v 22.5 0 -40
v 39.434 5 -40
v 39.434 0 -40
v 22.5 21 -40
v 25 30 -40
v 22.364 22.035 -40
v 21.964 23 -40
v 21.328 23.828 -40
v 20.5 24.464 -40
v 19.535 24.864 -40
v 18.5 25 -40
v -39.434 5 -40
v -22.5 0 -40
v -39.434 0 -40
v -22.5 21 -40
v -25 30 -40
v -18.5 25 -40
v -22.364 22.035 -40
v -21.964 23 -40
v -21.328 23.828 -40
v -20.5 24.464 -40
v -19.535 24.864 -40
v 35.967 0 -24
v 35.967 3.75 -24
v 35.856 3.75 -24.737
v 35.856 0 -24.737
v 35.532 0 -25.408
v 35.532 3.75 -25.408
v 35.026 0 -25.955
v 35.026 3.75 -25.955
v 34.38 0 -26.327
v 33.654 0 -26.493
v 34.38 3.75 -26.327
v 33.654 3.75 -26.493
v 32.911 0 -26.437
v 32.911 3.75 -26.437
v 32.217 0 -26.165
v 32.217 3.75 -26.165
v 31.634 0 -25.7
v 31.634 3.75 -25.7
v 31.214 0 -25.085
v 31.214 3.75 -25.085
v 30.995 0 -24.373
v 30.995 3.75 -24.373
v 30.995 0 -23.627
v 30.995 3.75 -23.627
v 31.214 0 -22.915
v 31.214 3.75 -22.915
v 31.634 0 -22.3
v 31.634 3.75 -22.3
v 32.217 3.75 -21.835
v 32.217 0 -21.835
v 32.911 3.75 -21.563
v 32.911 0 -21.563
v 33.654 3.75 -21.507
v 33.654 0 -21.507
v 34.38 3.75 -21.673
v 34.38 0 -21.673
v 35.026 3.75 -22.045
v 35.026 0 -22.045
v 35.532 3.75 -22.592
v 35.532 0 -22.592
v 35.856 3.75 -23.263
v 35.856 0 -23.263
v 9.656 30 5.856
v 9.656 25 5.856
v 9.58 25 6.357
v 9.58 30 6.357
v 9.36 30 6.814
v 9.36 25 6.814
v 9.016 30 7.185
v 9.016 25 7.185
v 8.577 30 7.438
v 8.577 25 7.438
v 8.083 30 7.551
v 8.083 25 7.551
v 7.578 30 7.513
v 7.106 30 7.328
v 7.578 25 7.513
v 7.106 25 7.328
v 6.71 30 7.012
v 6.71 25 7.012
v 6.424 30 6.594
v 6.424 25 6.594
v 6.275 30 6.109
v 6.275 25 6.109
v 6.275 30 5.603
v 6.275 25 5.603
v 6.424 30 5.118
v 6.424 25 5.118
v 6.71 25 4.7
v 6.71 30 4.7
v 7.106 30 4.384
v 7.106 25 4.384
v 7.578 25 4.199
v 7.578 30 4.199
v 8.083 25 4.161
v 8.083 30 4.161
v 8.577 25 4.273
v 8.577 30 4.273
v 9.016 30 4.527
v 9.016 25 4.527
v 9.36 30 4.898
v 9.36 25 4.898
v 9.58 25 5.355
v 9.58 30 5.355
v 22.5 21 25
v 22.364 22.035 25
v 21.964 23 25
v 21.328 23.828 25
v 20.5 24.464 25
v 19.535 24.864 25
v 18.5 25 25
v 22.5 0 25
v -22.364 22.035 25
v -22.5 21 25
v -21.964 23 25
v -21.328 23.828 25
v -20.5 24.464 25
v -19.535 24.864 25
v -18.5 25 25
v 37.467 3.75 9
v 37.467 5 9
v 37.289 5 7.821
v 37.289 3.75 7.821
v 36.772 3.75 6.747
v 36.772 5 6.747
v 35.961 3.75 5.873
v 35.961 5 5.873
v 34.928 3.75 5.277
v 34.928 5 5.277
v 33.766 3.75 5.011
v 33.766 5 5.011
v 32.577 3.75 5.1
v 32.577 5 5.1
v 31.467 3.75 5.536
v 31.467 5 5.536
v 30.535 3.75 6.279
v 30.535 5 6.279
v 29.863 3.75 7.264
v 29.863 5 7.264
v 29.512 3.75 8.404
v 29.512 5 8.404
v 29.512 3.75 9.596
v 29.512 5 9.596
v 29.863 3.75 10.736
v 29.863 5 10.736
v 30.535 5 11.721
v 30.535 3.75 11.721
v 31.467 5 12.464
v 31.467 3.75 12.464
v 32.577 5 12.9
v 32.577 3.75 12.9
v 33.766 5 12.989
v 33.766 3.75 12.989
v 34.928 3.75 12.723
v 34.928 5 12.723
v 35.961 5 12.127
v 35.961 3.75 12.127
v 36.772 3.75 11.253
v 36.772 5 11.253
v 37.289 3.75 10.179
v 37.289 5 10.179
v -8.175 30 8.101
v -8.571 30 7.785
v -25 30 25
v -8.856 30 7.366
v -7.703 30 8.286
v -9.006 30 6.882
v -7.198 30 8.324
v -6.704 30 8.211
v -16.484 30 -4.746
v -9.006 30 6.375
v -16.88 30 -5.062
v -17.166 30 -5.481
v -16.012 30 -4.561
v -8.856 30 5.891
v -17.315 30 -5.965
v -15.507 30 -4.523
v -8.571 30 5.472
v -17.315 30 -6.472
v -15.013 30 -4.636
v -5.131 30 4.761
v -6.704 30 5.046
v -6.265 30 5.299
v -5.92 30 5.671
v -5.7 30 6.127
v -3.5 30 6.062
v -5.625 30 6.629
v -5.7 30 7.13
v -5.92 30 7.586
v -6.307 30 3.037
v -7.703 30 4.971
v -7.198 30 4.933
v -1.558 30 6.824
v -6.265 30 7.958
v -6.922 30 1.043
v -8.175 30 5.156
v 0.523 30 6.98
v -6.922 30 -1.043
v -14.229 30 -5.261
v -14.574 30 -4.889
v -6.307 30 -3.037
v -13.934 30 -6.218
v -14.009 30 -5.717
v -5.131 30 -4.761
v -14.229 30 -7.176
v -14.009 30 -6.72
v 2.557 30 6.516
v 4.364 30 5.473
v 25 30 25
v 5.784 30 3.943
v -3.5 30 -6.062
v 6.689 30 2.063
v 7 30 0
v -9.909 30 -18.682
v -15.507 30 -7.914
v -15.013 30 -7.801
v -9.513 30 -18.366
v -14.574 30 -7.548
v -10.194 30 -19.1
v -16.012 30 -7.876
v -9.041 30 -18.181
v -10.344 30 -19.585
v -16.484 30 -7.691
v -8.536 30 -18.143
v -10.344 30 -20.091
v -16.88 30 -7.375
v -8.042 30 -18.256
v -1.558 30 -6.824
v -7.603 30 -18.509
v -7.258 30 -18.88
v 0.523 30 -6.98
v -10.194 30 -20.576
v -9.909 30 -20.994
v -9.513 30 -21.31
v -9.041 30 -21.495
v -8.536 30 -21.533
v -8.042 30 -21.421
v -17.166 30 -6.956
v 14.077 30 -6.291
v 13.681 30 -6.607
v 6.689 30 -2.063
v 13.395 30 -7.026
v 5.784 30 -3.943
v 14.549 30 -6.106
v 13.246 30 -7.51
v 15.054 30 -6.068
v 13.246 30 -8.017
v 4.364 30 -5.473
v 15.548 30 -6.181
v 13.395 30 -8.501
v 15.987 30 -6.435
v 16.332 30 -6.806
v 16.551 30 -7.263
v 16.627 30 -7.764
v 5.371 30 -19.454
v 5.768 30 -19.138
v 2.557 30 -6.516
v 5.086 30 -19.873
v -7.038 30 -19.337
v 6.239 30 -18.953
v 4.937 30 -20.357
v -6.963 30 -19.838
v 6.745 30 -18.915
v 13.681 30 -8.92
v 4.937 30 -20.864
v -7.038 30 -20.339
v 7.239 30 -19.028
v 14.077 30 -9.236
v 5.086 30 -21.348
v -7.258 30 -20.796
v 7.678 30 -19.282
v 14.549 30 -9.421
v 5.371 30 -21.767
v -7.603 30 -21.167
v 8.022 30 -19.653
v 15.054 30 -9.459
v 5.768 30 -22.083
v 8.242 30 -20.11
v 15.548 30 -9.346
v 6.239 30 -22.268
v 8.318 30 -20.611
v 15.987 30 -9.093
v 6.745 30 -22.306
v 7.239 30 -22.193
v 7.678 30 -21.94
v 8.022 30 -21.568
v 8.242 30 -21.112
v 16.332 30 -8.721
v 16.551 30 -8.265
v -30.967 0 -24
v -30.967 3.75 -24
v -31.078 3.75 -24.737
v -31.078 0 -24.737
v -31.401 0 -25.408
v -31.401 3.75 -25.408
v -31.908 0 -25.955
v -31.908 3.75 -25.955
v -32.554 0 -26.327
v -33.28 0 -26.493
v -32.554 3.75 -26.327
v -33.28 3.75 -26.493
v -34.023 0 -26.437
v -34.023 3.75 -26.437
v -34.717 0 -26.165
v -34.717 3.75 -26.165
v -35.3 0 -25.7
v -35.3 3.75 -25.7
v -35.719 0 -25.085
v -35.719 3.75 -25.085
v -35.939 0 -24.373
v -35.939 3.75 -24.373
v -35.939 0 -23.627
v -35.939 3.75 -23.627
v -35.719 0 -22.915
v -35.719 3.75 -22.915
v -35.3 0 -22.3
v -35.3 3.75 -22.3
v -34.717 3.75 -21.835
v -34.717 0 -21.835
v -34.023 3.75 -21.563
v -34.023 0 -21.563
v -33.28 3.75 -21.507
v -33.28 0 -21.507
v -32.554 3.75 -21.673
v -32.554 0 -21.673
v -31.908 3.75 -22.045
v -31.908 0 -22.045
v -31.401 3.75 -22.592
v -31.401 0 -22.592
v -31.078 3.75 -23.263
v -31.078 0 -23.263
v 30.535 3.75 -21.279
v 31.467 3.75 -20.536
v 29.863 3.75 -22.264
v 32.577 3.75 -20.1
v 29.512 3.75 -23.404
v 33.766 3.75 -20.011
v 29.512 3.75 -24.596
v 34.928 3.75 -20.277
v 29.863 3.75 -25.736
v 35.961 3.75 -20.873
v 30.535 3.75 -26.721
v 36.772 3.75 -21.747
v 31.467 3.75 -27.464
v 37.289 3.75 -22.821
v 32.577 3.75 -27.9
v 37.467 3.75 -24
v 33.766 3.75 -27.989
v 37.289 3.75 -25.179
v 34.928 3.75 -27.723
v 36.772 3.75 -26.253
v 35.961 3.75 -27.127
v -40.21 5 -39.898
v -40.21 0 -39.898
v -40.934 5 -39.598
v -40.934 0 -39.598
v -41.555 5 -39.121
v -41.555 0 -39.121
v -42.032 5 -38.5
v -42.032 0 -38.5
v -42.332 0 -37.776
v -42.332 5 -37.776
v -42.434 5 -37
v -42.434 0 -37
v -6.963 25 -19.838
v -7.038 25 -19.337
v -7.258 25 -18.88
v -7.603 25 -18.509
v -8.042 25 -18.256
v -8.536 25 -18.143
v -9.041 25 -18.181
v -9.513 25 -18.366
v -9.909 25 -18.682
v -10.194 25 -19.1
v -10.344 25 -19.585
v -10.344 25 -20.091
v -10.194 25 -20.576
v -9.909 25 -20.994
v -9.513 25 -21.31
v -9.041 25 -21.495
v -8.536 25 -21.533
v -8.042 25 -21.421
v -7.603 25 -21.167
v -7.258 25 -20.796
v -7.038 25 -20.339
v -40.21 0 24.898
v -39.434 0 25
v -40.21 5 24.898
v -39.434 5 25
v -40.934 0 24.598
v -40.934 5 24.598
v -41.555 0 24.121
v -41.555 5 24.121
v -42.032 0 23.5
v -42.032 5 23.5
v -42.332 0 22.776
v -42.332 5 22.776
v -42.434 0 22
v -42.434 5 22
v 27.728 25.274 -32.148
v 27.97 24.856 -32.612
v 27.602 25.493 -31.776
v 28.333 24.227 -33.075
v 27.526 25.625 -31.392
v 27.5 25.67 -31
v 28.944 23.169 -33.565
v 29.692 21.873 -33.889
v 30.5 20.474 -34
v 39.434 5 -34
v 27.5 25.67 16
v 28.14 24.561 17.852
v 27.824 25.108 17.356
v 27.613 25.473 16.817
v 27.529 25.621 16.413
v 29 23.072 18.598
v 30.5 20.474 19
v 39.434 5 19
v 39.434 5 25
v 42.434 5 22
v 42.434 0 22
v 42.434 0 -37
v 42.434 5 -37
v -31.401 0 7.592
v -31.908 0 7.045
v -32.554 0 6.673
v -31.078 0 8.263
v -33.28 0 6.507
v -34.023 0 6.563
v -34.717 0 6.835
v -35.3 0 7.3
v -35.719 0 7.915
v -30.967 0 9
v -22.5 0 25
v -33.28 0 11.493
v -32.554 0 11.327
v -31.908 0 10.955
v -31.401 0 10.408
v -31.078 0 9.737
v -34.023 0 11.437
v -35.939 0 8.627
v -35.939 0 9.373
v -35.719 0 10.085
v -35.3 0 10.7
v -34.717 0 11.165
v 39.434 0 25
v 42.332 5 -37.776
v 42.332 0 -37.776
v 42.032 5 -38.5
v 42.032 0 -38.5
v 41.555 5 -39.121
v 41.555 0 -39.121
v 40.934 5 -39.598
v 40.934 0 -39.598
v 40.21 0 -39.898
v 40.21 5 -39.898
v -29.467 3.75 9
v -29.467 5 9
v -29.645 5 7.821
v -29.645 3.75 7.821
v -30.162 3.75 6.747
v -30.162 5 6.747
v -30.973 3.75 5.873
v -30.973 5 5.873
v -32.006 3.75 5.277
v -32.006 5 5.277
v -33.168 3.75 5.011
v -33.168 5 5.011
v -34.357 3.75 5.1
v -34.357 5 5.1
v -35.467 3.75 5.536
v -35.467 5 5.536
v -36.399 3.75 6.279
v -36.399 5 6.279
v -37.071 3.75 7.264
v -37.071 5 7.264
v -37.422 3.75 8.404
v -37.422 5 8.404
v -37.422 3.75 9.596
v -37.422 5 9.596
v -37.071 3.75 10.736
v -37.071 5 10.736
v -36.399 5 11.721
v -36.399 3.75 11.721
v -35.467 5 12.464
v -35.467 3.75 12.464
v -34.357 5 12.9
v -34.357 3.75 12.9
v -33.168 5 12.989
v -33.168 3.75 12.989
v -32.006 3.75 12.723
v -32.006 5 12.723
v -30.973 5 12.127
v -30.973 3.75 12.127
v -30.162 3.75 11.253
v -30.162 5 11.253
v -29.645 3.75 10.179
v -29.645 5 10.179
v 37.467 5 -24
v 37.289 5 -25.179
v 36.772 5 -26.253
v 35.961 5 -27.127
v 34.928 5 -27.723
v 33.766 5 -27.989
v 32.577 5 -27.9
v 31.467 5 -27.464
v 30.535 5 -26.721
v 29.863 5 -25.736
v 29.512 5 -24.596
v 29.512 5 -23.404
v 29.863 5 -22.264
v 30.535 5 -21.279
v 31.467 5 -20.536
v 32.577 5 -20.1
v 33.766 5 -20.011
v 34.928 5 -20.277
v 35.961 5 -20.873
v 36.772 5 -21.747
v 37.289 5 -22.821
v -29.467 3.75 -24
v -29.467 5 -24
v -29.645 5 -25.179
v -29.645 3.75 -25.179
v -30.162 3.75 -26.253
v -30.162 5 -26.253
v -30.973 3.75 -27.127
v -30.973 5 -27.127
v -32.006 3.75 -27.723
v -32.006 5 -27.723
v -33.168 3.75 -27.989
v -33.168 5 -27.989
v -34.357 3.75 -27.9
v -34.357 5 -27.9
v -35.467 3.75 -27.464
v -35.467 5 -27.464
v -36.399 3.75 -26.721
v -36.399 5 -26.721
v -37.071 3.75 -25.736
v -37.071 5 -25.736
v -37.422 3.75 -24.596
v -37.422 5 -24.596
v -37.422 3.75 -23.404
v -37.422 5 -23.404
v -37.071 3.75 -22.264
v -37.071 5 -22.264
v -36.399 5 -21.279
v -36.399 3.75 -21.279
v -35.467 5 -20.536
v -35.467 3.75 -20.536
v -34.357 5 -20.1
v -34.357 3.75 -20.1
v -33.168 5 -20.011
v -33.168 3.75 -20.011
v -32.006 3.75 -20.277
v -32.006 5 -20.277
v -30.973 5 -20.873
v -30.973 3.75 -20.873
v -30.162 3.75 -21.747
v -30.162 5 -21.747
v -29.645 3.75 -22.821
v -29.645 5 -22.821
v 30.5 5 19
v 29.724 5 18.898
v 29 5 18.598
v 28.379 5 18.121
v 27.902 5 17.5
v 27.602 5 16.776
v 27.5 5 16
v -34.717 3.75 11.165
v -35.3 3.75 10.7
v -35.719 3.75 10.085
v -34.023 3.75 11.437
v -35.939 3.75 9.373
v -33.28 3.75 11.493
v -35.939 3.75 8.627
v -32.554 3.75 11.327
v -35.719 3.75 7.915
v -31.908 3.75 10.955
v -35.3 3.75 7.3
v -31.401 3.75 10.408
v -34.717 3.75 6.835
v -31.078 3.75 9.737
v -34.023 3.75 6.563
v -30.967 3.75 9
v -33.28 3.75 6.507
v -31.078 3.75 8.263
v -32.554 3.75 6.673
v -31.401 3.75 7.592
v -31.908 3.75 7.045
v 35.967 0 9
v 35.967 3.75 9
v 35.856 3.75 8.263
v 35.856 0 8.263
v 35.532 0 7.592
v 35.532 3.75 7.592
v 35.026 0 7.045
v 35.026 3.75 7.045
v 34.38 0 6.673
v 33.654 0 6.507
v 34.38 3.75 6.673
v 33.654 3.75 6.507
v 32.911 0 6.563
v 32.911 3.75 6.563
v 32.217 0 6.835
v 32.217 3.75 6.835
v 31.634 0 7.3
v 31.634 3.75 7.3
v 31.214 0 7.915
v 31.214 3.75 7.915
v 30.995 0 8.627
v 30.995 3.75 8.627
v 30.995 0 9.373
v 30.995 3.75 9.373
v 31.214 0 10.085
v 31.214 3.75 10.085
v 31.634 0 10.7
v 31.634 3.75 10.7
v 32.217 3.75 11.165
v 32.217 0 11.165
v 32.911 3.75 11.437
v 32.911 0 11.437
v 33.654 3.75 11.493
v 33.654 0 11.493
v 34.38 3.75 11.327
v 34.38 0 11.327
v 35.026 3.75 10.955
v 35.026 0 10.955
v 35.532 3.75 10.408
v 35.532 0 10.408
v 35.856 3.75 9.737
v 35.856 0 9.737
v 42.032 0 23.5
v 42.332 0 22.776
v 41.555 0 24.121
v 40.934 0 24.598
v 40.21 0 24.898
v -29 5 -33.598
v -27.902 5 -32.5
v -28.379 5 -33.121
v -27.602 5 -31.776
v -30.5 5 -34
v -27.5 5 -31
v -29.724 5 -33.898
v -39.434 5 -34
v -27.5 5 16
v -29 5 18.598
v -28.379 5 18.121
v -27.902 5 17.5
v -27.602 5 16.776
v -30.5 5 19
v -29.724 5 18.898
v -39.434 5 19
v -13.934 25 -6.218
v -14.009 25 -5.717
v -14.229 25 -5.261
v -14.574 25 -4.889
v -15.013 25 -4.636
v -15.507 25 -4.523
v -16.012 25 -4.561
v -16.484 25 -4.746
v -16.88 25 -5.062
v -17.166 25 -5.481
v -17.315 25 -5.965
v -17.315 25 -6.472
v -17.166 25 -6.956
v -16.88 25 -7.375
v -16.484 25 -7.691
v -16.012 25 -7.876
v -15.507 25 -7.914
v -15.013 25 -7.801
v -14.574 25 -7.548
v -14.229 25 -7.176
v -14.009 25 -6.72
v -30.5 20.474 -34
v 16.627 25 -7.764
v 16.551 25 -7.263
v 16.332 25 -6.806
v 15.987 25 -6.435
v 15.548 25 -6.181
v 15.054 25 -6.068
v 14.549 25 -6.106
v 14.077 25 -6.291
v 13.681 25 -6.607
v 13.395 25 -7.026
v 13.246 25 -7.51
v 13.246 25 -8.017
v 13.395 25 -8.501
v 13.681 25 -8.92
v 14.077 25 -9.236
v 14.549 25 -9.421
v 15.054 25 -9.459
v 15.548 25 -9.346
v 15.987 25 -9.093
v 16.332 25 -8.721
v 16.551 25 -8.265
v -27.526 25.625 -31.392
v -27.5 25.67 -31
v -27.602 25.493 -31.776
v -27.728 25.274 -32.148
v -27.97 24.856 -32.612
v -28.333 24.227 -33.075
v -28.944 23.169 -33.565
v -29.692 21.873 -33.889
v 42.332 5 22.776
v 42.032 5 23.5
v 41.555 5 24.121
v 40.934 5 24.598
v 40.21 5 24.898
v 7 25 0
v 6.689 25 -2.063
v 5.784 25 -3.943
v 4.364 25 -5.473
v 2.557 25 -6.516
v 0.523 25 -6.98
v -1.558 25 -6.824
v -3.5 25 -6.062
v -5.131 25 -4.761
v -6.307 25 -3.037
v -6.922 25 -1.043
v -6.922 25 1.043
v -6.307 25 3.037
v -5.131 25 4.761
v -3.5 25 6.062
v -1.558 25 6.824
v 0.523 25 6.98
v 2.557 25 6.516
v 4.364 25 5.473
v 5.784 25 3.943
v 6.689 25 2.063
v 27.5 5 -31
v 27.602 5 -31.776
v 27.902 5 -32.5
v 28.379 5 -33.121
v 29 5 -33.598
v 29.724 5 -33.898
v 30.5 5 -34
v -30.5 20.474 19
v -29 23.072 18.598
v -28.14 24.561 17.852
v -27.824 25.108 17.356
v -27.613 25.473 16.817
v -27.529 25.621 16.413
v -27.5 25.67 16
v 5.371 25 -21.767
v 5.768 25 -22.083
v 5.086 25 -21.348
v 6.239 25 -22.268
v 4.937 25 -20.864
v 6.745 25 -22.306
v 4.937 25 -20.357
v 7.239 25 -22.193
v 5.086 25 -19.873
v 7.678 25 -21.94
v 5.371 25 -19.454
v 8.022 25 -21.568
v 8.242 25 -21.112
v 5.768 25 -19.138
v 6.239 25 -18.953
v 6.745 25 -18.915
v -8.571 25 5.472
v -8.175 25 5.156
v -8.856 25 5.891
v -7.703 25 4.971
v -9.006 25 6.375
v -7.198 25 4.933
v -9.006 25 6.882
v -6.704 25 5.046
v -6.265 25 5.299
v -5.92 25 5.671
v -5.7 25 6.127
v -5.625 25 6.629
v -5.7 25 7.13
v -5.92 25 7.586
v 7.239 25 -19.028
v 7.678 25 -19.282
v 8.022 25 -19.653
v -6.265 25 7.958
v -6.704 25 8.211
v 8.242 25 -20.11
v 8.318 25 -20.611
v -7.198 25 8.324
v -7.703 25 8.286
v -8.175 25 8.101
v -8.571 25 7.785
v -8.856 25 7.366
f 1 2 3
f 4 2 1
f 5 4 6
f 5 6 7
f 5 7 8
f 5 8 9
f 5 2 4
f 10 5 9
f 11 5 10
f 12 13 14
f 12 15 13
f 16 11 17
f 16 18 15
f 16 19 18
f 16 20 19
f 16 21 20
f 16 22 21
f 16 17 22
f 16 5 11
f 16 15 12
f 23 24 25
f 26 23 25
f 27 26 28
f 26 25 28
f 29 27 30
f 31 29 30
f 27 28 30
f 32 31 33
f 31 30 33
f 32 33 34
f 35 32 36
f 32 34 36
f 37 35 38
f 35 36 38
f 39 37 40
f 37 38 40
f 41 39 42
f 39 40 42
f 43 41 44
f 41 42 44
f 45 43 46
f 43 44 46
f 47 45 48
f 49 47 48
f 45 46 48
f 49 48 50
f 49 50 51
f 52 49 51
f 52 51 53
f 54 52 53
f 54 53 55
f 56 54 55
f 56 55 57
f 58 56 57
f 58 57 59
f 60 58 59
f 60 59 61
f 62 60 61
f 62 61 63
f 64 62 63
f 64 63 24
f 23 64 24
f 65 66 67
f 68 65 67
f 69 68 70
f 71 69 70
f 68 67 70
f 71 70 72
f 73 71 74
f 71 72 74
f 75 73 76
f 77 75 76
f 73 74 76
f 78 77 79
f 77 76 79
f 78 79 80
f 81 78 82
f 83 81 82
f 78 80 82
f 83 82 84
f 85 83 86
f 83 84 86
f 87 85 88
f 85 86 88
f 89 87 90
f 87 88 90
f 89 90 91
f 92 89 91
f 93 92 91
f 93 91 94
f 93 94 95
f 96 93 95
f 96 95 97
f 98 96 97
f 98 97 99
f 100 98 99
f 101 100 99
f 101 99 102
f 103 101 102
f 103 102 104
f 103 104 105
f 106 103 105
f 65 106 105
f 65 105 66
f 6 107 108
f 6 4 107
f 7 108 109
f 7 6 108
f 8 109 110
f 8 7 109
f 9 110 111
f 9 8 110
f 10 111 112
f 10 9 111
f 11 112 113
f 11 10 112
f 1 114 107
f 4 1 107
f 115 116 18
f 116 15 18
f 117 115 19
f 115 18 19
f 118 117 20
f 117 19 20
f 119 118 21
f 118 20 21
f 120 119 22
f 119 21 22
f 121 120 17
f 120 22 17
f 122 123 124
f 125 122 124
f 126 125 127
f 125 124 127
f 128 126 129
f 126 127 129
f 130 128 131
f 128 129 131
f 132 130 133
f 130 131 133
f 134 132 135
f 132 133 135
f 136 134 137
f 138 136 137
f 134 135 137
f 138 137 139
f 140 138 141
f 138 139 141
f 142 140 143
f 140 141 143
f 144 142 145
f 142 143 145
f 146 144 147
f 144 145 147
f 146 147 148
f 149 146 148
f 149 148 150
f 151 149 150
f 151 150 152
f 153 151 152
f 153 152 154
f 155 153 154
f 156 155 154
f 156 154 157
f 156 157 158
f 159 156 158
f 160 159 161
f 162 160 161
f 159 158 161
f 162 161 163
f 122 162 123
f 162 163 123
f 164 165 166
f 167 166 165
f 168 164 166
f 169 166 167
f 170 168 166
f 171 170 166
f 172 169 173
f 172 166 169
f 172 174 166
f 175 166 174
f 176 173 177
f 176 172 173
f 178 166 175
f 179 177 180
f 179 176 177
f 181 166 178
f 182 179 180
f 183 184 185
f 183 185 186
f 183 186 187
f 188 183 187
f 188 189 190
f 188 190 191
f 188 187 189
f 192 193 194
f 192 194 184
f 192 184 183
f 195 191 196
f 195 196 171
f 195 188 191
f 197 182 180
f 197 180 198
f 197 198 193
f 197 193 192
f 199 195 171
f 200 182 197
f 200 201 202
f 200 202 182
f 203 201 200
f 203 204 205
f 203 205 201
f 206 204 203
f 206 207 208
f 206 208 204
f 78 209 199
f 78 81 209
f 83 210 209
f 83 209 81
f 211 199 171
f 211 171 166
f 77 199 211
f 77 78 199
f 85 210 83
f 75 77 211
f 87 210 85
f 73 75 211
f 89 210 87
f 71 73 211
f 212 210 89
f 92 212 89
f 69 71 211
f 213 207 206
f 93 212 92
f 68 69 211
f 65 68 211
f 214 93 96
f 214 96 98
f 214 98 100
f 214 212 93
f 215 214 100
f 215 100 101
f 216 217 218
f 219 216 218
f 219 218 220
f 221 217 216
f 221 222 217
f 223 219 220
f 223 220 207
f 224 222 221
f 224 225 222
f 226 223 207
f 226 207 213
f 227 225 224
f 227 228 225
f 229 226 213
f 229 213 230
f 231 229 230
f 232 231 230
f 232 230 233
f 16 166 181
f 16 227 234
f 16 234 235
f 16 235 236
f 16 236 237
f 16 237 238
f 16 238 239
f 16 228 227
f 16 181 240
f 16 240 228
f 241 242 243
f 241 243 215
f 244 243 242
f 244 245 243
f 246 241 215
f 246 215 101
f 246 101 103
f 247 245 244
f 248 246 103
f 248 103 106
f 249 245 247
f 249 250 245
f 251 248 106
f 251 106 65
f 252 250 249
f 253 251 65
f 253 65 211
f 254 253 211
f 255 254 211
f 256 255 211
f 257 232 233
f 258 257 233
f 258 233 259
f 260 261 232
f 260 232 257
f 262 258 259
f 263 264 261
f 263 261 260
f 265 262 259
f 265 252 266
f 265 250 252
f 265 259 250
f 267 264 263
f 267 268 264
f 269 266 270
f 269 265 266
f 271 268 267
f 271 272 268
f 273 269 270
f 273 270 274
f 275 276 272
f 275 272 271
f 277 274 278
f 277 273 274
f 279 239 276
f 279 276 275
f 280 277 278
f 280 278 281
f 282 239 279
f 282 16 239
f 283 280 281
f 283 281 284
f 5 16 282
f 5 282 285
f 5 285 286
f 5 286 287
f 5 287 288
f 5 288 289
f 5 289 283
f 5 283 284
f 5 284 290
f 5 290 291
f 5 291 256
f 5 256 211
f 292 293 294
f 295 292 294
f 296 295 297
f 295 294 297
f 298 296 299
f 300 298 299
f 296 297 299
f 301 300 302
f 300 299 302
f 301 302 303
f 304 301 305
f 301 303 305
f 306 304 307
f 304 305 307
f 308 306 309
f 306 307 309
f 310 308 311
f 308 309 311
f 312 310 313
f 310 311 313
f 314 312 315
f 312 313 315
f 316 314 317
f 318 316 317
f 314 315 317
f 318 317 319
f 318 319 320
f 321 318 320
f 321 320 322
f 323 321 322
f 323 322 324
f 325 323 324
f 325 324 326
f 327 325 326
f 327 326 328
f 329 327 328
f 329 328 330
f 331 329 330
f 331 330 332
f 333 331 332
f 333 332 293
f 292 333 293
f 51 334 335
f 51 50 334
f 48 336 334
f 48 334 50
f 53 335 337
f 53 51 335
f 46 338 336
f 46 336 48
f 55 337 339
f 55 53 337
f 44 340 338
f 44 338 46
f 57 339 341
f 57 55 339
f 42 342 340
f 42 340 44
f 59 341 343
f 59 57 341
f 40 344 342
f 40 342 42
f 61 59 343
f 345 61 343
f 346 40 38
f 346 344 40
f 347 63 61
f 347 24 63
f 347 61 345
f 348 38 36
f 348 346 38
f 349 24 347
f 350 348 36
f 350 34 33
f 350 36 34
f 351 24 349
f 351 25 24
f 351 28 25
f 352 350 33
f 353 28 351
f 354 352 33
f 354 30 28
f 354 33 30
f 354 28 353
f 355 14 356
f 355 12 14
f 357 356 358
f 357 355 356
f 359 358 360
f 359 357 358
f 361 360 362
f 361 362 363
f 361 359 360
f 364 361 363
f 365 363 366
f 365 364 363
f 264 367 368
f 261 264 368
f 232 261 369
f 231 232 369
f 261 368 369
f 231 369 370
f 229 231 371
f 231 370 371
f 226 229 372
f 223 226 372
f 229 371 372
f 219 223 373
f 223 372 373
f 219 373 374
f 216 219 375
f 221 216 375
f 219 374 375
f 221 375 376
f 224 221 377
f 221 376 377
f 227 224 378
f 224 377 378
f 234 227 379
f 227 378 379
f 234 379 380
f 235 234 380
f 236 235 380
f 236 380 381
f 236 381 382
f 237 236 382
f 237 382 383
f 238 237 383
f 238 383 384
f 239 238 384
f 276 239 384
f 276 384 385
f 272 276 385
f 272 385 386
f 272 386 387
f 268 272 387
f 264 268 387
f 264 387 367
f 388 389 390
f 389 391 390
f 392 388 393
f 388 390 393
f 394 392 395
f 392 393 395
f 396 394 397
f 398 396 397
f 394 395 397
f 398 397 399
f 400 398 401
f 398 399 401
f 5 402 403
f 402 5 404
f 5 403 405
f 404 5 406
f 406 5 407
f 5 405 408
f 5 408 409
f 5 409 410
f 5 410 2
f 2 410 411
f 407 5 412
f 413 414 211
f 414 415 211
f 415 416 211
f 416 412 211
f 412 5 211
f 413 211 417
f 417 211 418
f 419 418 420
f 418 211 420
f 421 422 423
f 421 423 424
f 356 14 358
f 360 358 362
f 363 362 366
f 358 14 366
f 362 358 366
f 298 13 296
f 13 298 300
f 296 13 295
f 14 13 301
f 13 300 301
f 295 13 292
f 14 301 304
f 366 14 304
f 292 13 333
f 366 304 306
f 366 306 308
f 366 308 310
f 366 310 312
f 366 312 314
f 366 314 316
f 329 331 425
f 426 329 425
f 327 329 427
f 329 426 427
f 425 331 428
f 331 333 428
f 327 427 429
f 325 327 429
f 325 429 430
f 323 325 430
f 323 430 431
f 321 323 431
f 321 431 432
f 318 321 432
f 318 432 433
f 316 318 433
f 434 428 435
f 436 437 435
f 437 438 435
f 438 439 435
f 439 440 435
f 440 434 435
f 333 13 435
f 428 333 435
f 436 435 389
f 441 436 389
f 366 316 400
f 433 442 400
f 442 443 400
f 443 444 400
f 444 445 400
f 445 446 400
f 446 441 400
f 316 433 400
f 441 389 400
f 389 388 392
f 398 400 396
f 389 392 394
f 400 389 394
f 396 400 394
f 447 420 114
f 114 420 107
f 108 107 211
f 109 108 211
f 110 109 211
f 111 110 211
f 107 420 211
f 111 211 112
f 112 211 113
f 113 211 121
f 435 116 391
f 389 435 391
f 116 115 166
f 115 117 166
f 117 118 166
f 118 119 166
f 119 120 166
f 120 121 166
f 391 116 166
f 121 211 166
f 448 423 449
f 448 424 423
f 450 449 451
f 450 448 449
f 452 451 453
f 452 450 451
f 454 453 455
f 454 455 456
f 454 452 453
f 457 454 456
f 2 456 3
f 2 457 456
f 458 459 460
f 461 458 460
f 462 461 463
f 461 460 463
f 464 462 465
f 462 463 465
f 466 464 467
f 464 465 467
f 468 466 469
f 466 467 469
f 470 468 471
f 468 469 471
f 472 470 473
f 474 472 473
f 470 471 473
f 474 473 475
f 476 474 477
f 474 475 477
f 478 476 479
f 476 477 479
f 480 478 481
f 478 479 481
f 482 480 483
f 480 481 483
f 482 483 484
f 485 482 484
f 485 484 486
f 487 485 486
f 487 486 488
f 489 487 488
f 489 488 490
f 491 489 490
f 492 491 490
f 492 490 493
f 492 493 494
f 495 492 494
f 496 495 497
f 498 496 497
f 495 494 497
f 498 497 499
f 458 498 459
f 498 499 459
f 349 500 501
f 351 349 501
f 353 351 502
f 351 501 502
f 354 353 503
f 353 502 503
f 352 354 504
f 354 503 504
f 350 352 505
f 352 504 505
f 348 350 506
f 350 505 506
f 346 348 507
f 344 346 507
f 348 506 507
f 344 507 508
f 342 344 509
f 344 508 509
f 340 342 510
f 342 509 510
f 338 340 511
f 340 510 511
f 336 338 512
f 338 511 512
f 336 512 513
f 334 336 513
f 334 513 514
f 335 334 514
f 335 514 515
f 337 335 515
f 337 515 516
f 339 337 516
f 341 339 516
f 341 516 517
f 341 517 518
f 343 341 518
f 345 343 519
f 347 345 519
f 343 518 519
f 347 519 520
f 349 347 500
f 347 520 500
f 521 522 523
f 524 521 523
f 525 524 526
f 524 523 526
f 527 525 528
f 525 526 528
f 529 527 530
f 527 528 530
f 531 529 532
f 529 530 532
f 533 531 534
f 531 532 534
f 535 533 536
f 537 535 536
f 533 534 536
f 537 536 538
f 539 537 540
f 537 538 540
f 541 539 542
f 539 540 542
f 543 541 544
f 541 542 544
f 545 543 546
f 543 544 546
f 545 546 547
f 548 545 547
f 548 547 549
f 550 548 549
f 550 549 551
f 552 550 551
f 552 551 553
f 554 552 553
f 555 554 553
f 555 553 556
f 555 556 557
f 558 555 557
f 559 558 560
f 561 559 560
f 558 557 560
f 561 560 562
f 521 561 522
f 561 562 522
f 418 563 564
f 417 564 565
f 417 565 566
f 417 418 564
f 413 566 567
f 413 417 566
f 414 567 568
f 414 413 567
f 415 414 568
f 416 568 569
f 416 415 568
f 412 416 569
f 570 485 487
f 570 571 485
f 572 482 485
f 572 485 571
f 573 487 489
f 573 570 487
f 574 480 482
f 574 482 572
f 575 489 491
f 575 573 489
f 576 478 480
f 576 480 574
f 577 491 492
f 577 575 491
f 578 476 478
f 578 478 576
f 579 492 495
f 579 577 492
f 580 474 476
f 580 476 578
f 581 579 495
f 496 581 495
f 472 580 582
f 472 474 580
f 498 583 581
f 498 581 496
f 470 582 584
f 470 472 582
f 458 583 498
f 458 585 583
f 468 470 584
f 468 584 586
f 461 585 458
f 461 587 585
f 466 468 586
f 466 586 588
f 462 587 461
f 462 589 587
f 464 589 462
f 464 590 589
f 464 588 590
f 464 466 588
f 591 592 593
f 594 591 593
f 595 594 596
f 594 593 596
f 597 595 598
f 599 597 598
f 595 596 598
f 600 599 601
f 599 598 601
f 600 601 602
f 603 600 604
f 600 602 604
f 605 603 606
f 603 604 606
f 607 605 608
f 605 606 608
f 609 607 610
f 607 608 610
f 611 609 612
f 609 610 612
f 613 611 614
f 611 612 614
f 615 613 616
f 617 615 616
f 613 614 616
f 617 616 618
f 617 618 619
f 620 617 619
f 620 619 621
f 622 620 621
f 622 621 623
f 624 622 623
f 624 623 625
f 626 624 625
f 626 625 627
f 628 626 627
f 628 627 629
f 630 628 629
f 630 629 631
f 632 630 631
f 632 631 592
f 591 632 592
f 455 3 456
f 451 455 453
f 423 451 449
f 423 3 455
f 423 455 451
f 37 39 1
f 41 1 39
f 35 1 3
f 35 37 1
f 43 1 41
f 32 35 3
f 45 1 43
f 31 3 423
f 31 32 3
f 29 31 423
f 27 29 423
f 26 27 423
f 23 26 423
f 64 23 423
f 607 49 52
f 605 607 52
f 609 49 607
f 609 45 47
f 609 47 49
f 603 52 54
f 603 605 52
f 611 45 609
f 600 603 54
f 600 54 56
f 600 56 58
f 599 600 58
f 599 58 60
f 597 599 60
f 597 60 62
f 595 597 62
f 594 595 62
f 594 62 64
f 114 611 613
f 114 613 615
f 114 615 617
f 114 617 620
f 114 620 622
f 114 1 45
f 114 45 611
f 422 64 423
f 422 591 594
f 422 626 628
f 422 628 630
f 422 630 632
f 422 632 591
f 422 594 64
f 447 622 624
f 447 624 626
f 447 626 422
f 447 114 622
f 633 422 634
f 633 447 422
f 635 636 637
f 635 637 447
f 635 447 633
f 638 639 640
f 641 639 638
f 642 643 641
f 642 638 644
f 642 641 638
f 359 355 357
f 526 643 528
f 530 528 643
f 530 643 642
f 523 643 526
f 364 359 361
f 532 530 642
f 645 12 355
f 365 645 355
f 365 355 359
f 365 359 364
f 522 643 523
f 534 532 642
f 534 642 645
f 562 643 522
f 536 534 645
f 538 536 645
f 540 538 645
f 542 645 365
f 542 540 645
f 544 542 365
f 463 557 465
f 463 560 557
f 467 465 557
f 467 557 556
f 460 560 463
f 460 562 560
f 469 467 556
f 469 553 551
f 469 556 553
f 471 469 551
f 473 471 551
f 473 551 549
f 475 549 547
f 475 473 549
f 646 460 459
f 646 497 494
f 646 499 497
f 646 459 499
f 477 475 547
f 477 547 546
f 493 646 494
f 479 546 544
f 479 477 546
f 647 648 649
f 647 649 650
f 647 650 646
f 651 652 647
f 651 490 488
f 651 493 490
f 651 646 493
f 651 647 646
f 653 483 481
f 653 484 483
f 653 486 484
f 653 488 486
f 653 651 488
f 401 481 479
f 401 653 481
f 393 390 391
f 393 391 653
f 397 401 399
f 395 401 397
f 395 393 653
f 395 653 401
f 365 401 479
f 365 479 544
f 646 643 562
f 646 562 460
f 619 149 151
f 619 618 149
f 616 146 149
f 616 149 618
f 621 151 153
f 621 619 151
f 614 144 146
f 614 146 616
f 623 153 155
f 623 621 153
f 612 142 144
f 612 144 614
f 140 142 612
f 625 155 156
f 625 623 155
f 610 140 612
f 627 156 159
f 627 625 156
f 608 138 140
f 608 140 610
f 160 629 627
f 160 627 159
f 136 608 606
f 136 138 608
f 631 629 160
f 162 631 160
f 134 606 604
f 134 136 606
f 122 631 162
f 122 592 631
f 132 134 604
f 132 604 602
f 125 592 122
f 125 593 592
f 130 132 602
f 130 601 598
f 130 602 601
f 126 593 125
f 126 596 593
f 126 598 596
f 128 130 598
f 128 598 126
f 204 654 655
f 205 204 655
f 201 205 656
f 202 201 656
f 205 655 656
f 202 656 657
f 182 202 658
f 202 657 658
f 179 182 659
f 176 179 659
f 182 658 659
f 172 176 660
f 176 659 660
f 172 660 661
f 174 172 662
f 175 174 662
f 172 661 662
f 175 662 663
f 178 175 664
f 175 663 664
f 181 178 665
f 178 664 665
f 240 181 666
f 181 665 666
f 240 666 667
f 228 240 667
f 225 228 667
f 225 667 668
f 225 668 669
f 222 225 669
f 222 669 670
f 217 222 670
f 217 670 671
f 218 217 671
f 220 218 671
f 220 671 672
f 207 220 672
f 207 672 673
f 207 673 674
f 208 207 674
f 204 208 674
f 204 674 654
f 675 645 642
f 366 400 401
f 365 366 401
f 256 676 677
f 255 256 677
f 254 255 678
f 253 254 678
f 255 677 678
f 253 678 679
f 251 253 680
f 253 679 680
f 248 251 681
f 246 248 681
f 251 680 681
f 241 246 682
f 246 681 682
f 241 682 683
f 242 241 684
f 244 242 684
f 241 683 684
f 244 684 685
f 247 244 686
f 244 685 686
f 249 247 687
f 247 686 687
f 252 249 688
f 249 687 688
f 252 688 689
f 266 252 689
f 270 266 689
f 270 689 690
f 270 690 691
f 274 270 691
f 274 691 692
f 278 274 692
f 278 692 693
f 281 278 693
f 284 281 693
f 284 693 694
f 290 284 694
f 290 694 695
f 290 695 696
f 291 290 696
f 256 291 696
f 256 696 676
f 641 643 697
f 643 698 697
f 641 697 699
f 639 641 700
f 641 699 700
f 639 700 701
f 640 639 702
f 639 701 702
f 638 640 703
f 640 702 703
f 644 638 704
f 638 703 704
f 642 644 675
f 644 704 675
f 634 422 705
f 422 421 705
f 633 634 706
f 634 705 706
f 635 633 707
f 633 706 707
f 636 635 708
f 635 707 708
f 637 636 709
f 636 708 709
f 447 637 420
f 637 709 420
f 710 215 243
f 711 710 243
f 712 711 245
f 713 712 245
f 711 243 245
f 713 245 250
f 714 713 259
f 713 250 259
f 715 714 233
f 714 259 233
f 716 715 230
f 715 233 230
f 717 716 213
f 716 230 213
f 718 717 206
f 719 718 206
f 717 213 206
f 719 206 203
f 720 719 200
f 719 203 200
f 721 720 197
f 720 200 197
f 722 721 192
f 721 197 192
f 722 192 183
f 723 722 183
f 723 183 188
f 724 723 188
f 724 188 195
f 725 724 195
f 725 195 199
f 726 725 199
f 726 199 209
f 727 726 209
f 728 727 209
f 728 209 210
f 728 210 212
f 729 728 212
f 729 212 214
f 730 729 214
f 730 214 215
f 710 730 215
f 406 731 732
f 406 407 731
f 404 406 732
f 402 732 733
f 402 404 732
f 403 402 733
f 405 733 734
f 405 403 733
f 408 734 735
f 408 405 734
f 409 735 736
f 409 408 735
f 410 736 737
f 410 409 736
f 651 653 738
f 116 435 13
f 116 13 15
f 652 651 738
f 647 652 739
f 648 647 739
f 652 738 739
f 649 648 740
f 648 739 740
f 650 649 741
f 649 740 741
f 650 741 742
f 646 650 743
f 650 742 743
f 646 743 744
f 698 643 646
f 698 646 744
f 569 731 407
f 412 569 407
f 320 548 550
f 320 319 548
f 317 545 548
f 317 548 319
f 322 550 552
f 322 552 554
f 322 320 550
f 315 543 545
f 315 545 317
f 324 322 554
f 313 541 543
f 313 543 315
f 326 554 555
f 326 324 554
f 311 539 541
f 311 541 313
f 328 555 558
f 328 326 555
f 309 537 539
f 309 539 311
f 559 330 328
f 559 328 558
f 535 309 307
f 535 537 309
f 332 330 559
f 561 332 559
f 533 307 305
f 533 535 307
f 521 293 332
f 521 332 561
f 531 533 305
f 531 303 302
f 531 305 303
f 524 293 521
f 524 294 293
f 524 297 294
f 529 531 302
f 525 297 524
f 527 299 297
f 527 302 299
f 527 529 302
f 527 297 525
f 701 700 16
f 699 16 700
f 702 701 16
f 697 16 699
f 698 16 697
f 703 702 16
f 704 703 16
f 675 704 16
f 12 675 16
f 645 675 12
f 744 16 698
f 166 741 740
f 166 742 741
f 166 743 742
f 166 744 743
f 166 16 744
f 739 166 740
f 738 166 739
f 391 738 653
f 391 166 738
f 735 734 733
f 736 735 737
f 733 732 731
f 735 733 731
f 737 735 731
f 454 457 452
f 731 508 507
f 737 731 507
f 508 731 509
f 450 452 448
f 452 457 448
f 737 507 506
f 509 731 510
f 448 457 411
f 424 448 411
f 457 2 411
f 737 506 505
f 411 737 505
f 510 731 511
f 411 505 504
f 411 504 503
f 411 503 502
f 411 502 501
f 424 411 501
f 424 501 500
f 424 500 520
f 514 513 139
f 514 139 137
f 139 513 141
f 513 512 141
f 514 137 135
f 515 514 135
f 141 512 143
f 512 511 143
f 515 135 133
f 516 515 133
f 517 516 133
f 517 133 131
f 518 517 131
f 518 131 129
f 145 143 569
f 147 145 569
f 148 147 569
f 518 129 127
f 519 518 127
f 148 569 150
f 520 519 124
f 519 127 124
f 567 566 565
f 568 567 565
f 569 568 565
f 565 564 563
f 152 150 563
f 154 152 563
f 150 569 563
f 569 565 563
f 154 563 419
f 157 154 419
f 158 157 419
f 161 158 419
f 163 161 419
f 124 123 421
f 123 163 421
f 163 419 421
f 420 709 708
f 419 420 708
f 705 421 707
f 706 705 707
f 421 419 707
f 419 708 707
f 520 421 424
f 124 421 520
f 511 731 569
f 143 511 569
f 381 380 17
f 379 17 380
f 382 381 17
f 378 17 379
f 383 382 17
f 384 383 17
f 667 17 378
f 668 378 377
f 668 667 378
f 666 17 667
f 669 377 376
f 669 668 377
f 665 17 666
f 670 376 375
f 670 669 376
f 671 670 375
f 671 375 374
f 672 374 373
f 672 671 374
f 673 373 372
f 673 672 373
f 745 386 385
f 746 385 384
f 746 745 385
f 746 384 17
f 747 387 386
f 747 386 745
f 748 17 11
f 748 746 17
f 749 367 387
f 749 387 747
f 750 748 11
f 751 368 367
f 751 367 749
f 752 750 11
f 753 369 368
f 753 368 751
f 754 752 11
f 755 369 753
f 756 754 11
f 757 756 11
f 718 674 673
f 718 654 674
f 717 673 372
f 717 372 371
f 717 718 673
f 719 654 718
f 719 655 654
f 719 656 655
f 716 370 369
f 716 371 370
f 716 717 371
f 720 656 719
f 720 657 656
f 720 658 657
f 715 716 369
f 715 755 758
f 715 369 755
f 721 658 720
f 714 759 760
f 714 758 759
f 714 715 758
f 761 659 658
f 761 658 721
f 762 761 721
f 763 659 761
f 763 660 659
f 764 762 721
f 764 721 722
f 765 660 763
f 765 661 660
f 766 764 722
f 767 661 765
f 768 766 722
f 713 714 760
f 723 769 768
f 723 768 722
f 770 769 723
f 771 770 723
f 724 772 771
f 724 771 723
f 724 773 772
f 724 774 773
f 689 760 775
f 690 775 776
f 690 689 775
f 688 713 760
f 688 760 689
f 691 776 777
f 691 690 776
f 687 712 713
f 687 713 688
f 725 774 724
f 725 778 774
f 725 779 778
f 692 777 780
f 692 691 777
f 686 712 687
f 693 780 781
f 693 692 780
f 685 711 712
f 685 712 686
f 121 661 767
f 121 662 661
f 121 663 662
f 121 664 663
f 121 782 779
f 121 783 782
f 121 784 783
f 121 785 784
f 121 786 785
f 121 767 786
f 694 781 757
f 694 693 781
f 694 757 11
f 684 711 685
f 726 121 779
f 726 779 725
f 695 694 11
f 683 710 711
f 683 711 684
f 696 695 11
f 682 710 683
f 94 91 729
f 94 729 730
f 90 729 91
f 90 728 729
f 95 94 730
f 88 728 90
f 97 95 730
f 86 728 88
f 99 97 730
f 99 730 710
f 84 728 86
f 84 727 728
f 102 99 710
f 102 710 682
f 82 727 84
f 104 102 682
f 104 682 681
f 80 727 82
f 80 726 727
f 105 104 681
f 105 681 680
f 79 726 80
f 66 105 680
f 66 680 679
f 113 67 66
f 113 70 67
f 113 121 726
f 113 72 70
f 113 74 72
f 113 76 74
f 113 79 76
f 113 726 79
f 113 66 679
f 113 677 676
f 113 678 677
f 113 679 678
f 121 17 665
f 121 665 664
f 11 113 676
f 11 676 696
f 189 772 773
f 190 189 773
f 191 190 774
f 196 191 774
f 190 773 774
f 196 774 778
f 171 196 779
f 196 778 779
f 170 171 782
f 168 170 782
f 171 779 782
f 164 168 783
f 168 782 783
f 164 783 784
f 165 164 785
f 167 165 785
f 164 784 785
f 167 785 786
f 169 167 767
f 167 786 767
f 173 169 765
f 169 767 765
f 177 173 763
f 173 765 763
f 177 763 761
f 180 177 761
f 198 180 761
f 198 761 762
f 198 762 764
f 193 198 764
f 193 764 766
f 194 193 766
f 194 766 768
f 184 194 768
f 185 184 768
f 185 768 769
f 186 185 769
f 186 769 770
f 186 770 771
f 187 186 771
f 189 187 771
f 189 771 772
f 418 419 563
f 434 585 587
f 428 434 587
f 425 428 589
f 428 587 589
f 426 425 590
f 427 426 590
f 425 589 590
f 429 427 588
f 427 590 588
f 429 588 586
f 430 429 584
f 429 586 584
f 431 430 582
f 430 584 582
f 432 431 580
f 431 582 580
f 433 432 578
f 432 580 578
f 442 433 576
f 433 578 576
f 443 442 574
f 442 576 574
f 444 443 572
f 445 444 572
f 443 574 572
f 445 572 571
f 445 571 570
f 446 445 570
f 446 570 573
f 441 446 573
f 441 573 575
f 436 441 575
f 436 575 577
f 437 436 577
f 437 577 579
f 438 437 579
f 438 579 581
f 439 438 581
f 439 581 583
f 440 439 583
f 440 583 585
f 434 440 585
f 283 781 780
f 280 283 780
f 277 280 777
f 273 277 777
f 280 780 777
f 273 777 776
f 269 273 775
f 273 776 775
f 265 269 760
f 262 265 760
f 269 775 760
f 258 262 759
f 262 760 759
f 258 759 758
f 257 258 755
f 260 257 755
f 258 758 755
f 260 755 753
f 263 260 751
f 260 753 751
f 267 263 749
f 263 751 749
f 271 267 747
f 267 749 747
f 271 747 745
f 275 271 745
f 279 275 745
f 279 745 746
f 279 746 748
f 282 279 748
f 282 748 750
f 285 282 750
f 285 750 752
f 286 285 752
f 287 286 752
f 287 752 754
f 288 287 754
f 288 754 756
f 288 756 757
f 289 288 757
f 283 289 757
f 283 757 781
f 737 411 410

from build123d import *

# Parameters (mm, degrees)
SKETCH1_W           = 50
SKETCH1_H           = 50
BOSS_EXTRUDE1_DEPTH = 30
SKETCH2_R           = 7
CUT_EXTRUDE1_DEPTH  = 30
SKETCH3_R           = 1.7
CUT_EXTRUDE2_DEPTH  = 42
SKETCH5_W           = 50
SKETCH5_H           = 15
BOSS_EXTRUDE2_DEPTH = 30
BOSS_EXTRUDE3_DEPTH = 65
SKETCH7_W           = 45
SKETCH7_H           = 42.253035939
CUT_EXTRUDE3_DEPTH  = 66
FILLET1_R           = 4
CUT_EXTRUDE4_DEPTH  = 53
SKETCH10_R          = 4
CUT_EXTRUDE5_DEPTH  = 1.25
SKETCH11_R          = 2.5
CUT_EXTRUDE6_DEPTH  = 36.25
CUT_EXTRUDE7_DEPTH  = 90.25
FILLET2_R           = 3
SKETCH13_W          = 3
SKETCH13_H          = 5
BOSS_EXTRUDE4_DEPTH = 65
FILLET3_R           = 3


with BuildPart() as part:
    # Sketch1 → Boss-Extrude1 (new body)
    with BuildSketch(Plane(origin=(0, 0, 0), x_dir=(1, 0, 0), z_dir=(0, 1, 0))):
        Rectangle(SKETCH1_W, SKETCH1_H)
    extrude(amount=BOSS_EXTRUDE1_DEPTH)

    # Sketch2 → Cut-Extrude1 (cut)
    with BuildSketch(Plane(origin=(0, 30, 0), x_dir=(1, 0, 0), z_dir=(0, 1, 0))):
        Circle(SKETCH2_R)
    extrude(amount=-CUT_EXTRUDE1_DEPTH, mode=Mode.SUBTRACT)

    # Sketch3 → Cut-Extrude2 (cut)
    with BuildSketch(Plane.XZ):
        with Locations((6.617670641, -20.610654448)):
            Circle(SKETCH3_R)
        with Locations((14.927003033, -7.763670553)):
            Circle(SKETCH3_R)
        with Locations((7.955854814, 5.855914334)):
            Circle(SKETCH3_R)
        with Locations((-7.324625797, 6.628515327)):
            Circle(SKETCH3_R)
        with Locations((-15.633958189, -6.218468568)):
            Circle(SKETCH3_R)
        with Locations((-8.66280997, -19.838053456)):
            Circle(SKETCH3_R)
    extrude(amount=-CUT_EXTRUDE2_DEPTH, mode=Mode.SUBTRACT)

    # Sketch5 → Boss-Extrude2 (add)
    with BuildSketch(Plane(origin=(0, 30, 0), x_dir=(1, 0, 0), z_dir=(0, 1, 0))):
        with Locations((0, 32.5)):
            Rectangle(SKETCH5_W, SKETCH5_H)
    extrude(amount=-BOSS_EXTRUDE2_DEPTH)

    # Sketch6 → Boss-Extrude3 (add)
    with BuildSketch(Plane.XY.offset(25)):
        Polygon((-25, 30), (-42.320508076, 0), (-25, 0), align=None)
    boss_extrude3 = extrude(amount=-BOSS_EXTRUDE3_DEPTH)

    # Mirror1: Boss-Extrude3 across plane
    add(boss_extrude3.mirror(Plane(origin=(0, 0, 0), x_dir=(0, 0, 1), z_dir=(1, 0, 0))))

    # Sketch7 → Cut-Extrude3 (cut)
    with BuildSketch(Plane.XY.offset(25)):
        with Locations((0, 3.87348203)):
            Rectangle(SKETCH7_W, SKETCH7_H)
    extrude(amount=-CUT_EXTRUDE3_DEPTH, mode=Mode.SUBTRACT)

    # Fillet1
    fillet1_edges = [part.edges().sort_by_distance(p)[0] for p in [
        (-22.5, 25, -7.5),
        (22.5, 25, -7.5),
    ]]
    fillet(fillet1_edges, radius=FILLET1_R)

    # Sketch9 → Cut-Extrude4 (cut)
    with BuildSketch(Plane.XY.offset(19)):
        Polygon((27.5, 25.669872981), (39.43375673, 5), (27.5, 5), align=None)
    cut_extrude4 = extrude(amount=-CUT_EXTRUDE4_DEPTH, mode=Mode.SUBTRACT)

    # Mirror2: Cut-Extrude4 across plane
    add(cut_extrude4.mirror(Plane(origin=(0, 0, 0), x_dir=(0, 0, 1), z_dir=(1, 0, 0))), mode=Mode.SUBTRACT)

    # Sketch10 → Cut-Extrude5 (cut)
    with BuildSketch(Plane(origin=(0, 5, 0), x_dir=(1, 0, 0), z_dir=(0, 1, 0))):
        with Locations((33.466878365, 24)):
            Circle(SKETCH10_R)
        with Locations((33.466878365, -9)):
            Circle(SKETCH10_R)
        with Locations((-33.466878365, -9)):
            Circle(SKETCH10_R)
        with Locations((-33.466878365, 24)):
            Circle(SKETCH10_R)
    extrude(amount=-CUT_EXTRUDE5_DEPTH, mode=Mode.SUBTRACT)

    # Sketch11 → Cut-Extrude6 (cut)
    with BuildSketch(Plane(origin=(0, 3.75, 0), x_dir=(1, 0, 0), z_dir=(0, 1, 0))):
        with Locations((33.466878365, 24)):
            Circle(SKETCH11_R)
        with Locations((33.466878365, -9)):
            Circle(SKETCH11_R)
        with Locations((-33.466878365, -9)):
            Circle(SKETCH11_R)
        with Locations((-33.466878365, 24)):
            Circle(SKETCH11_R)
    extrude(amount=-CUT_EXTRUDE6_DEPTH, mode=Mode.SUBTRACT)

    # Sketch12 → Cut-Extrude7 (cut)
    with BuildSketch(Plane.XY.offset(25)):
        Polygon((42.320508076, 0), (39.43375673, 5), (39.43375673, 0), align=None)
    cut_extrude7 = extrude(amount=-CUT_EXTRUDE7_DEPTH, mode=Mode.SUBTRACT)

    # Mirror3: Cut-Extrude7 across plane
    add(cut_extrude7.mirror(Plane(origin=(0, 0, 0), x_dir=(0, 0, 1), z_dir=(1, 0, 0))), mode=Mode.SUBTRACT)

    # Fillet2
    fillet2_edges = [part.edges().sort_by_distance(p)[0] for p in [
        (27.5, 15.334936491, 19),
        (27.5, 15.334936491, -34),
        (-27.5, 15.334936491, -34),
        (-27.5, 15.334936491, 19),
    ]]
    fillet(fillet2_edges, radius=FILLET2_R)

    # Sketch13 → Boss-Extrude4 (add)
    with BuildSketch(Plane.XY.offset(25)):
        with Locations((40.93375673, 2.5)):
            Rectangle(SKETCH13_W, SKETCH13_H)
    boss_extrude4 = extrude(amount=-BOSS_EXTRUDE4_DEPTH)

    # Mirror4: Boss-Extrude4 across plane
    add(boss_extrude4.mirror(Plane(origin=(0, 0, 0), x_dir=(0, 0, 1), z_dir=(1, 0, 0))))

    # Fillet3
    fillet3_edges = [part.edges().sort_by_distance(p)[0] for p in [
        (42.43375673, 2.5, -40),
        (42.43375673, 2.5, 25),
        (-42.43375673, 2.5, 25),
        (-42.43375673, 2.5, -40),
    ]]
    fillet(fillet3_edges, radius=FILLET3_R)


solid = part.part
